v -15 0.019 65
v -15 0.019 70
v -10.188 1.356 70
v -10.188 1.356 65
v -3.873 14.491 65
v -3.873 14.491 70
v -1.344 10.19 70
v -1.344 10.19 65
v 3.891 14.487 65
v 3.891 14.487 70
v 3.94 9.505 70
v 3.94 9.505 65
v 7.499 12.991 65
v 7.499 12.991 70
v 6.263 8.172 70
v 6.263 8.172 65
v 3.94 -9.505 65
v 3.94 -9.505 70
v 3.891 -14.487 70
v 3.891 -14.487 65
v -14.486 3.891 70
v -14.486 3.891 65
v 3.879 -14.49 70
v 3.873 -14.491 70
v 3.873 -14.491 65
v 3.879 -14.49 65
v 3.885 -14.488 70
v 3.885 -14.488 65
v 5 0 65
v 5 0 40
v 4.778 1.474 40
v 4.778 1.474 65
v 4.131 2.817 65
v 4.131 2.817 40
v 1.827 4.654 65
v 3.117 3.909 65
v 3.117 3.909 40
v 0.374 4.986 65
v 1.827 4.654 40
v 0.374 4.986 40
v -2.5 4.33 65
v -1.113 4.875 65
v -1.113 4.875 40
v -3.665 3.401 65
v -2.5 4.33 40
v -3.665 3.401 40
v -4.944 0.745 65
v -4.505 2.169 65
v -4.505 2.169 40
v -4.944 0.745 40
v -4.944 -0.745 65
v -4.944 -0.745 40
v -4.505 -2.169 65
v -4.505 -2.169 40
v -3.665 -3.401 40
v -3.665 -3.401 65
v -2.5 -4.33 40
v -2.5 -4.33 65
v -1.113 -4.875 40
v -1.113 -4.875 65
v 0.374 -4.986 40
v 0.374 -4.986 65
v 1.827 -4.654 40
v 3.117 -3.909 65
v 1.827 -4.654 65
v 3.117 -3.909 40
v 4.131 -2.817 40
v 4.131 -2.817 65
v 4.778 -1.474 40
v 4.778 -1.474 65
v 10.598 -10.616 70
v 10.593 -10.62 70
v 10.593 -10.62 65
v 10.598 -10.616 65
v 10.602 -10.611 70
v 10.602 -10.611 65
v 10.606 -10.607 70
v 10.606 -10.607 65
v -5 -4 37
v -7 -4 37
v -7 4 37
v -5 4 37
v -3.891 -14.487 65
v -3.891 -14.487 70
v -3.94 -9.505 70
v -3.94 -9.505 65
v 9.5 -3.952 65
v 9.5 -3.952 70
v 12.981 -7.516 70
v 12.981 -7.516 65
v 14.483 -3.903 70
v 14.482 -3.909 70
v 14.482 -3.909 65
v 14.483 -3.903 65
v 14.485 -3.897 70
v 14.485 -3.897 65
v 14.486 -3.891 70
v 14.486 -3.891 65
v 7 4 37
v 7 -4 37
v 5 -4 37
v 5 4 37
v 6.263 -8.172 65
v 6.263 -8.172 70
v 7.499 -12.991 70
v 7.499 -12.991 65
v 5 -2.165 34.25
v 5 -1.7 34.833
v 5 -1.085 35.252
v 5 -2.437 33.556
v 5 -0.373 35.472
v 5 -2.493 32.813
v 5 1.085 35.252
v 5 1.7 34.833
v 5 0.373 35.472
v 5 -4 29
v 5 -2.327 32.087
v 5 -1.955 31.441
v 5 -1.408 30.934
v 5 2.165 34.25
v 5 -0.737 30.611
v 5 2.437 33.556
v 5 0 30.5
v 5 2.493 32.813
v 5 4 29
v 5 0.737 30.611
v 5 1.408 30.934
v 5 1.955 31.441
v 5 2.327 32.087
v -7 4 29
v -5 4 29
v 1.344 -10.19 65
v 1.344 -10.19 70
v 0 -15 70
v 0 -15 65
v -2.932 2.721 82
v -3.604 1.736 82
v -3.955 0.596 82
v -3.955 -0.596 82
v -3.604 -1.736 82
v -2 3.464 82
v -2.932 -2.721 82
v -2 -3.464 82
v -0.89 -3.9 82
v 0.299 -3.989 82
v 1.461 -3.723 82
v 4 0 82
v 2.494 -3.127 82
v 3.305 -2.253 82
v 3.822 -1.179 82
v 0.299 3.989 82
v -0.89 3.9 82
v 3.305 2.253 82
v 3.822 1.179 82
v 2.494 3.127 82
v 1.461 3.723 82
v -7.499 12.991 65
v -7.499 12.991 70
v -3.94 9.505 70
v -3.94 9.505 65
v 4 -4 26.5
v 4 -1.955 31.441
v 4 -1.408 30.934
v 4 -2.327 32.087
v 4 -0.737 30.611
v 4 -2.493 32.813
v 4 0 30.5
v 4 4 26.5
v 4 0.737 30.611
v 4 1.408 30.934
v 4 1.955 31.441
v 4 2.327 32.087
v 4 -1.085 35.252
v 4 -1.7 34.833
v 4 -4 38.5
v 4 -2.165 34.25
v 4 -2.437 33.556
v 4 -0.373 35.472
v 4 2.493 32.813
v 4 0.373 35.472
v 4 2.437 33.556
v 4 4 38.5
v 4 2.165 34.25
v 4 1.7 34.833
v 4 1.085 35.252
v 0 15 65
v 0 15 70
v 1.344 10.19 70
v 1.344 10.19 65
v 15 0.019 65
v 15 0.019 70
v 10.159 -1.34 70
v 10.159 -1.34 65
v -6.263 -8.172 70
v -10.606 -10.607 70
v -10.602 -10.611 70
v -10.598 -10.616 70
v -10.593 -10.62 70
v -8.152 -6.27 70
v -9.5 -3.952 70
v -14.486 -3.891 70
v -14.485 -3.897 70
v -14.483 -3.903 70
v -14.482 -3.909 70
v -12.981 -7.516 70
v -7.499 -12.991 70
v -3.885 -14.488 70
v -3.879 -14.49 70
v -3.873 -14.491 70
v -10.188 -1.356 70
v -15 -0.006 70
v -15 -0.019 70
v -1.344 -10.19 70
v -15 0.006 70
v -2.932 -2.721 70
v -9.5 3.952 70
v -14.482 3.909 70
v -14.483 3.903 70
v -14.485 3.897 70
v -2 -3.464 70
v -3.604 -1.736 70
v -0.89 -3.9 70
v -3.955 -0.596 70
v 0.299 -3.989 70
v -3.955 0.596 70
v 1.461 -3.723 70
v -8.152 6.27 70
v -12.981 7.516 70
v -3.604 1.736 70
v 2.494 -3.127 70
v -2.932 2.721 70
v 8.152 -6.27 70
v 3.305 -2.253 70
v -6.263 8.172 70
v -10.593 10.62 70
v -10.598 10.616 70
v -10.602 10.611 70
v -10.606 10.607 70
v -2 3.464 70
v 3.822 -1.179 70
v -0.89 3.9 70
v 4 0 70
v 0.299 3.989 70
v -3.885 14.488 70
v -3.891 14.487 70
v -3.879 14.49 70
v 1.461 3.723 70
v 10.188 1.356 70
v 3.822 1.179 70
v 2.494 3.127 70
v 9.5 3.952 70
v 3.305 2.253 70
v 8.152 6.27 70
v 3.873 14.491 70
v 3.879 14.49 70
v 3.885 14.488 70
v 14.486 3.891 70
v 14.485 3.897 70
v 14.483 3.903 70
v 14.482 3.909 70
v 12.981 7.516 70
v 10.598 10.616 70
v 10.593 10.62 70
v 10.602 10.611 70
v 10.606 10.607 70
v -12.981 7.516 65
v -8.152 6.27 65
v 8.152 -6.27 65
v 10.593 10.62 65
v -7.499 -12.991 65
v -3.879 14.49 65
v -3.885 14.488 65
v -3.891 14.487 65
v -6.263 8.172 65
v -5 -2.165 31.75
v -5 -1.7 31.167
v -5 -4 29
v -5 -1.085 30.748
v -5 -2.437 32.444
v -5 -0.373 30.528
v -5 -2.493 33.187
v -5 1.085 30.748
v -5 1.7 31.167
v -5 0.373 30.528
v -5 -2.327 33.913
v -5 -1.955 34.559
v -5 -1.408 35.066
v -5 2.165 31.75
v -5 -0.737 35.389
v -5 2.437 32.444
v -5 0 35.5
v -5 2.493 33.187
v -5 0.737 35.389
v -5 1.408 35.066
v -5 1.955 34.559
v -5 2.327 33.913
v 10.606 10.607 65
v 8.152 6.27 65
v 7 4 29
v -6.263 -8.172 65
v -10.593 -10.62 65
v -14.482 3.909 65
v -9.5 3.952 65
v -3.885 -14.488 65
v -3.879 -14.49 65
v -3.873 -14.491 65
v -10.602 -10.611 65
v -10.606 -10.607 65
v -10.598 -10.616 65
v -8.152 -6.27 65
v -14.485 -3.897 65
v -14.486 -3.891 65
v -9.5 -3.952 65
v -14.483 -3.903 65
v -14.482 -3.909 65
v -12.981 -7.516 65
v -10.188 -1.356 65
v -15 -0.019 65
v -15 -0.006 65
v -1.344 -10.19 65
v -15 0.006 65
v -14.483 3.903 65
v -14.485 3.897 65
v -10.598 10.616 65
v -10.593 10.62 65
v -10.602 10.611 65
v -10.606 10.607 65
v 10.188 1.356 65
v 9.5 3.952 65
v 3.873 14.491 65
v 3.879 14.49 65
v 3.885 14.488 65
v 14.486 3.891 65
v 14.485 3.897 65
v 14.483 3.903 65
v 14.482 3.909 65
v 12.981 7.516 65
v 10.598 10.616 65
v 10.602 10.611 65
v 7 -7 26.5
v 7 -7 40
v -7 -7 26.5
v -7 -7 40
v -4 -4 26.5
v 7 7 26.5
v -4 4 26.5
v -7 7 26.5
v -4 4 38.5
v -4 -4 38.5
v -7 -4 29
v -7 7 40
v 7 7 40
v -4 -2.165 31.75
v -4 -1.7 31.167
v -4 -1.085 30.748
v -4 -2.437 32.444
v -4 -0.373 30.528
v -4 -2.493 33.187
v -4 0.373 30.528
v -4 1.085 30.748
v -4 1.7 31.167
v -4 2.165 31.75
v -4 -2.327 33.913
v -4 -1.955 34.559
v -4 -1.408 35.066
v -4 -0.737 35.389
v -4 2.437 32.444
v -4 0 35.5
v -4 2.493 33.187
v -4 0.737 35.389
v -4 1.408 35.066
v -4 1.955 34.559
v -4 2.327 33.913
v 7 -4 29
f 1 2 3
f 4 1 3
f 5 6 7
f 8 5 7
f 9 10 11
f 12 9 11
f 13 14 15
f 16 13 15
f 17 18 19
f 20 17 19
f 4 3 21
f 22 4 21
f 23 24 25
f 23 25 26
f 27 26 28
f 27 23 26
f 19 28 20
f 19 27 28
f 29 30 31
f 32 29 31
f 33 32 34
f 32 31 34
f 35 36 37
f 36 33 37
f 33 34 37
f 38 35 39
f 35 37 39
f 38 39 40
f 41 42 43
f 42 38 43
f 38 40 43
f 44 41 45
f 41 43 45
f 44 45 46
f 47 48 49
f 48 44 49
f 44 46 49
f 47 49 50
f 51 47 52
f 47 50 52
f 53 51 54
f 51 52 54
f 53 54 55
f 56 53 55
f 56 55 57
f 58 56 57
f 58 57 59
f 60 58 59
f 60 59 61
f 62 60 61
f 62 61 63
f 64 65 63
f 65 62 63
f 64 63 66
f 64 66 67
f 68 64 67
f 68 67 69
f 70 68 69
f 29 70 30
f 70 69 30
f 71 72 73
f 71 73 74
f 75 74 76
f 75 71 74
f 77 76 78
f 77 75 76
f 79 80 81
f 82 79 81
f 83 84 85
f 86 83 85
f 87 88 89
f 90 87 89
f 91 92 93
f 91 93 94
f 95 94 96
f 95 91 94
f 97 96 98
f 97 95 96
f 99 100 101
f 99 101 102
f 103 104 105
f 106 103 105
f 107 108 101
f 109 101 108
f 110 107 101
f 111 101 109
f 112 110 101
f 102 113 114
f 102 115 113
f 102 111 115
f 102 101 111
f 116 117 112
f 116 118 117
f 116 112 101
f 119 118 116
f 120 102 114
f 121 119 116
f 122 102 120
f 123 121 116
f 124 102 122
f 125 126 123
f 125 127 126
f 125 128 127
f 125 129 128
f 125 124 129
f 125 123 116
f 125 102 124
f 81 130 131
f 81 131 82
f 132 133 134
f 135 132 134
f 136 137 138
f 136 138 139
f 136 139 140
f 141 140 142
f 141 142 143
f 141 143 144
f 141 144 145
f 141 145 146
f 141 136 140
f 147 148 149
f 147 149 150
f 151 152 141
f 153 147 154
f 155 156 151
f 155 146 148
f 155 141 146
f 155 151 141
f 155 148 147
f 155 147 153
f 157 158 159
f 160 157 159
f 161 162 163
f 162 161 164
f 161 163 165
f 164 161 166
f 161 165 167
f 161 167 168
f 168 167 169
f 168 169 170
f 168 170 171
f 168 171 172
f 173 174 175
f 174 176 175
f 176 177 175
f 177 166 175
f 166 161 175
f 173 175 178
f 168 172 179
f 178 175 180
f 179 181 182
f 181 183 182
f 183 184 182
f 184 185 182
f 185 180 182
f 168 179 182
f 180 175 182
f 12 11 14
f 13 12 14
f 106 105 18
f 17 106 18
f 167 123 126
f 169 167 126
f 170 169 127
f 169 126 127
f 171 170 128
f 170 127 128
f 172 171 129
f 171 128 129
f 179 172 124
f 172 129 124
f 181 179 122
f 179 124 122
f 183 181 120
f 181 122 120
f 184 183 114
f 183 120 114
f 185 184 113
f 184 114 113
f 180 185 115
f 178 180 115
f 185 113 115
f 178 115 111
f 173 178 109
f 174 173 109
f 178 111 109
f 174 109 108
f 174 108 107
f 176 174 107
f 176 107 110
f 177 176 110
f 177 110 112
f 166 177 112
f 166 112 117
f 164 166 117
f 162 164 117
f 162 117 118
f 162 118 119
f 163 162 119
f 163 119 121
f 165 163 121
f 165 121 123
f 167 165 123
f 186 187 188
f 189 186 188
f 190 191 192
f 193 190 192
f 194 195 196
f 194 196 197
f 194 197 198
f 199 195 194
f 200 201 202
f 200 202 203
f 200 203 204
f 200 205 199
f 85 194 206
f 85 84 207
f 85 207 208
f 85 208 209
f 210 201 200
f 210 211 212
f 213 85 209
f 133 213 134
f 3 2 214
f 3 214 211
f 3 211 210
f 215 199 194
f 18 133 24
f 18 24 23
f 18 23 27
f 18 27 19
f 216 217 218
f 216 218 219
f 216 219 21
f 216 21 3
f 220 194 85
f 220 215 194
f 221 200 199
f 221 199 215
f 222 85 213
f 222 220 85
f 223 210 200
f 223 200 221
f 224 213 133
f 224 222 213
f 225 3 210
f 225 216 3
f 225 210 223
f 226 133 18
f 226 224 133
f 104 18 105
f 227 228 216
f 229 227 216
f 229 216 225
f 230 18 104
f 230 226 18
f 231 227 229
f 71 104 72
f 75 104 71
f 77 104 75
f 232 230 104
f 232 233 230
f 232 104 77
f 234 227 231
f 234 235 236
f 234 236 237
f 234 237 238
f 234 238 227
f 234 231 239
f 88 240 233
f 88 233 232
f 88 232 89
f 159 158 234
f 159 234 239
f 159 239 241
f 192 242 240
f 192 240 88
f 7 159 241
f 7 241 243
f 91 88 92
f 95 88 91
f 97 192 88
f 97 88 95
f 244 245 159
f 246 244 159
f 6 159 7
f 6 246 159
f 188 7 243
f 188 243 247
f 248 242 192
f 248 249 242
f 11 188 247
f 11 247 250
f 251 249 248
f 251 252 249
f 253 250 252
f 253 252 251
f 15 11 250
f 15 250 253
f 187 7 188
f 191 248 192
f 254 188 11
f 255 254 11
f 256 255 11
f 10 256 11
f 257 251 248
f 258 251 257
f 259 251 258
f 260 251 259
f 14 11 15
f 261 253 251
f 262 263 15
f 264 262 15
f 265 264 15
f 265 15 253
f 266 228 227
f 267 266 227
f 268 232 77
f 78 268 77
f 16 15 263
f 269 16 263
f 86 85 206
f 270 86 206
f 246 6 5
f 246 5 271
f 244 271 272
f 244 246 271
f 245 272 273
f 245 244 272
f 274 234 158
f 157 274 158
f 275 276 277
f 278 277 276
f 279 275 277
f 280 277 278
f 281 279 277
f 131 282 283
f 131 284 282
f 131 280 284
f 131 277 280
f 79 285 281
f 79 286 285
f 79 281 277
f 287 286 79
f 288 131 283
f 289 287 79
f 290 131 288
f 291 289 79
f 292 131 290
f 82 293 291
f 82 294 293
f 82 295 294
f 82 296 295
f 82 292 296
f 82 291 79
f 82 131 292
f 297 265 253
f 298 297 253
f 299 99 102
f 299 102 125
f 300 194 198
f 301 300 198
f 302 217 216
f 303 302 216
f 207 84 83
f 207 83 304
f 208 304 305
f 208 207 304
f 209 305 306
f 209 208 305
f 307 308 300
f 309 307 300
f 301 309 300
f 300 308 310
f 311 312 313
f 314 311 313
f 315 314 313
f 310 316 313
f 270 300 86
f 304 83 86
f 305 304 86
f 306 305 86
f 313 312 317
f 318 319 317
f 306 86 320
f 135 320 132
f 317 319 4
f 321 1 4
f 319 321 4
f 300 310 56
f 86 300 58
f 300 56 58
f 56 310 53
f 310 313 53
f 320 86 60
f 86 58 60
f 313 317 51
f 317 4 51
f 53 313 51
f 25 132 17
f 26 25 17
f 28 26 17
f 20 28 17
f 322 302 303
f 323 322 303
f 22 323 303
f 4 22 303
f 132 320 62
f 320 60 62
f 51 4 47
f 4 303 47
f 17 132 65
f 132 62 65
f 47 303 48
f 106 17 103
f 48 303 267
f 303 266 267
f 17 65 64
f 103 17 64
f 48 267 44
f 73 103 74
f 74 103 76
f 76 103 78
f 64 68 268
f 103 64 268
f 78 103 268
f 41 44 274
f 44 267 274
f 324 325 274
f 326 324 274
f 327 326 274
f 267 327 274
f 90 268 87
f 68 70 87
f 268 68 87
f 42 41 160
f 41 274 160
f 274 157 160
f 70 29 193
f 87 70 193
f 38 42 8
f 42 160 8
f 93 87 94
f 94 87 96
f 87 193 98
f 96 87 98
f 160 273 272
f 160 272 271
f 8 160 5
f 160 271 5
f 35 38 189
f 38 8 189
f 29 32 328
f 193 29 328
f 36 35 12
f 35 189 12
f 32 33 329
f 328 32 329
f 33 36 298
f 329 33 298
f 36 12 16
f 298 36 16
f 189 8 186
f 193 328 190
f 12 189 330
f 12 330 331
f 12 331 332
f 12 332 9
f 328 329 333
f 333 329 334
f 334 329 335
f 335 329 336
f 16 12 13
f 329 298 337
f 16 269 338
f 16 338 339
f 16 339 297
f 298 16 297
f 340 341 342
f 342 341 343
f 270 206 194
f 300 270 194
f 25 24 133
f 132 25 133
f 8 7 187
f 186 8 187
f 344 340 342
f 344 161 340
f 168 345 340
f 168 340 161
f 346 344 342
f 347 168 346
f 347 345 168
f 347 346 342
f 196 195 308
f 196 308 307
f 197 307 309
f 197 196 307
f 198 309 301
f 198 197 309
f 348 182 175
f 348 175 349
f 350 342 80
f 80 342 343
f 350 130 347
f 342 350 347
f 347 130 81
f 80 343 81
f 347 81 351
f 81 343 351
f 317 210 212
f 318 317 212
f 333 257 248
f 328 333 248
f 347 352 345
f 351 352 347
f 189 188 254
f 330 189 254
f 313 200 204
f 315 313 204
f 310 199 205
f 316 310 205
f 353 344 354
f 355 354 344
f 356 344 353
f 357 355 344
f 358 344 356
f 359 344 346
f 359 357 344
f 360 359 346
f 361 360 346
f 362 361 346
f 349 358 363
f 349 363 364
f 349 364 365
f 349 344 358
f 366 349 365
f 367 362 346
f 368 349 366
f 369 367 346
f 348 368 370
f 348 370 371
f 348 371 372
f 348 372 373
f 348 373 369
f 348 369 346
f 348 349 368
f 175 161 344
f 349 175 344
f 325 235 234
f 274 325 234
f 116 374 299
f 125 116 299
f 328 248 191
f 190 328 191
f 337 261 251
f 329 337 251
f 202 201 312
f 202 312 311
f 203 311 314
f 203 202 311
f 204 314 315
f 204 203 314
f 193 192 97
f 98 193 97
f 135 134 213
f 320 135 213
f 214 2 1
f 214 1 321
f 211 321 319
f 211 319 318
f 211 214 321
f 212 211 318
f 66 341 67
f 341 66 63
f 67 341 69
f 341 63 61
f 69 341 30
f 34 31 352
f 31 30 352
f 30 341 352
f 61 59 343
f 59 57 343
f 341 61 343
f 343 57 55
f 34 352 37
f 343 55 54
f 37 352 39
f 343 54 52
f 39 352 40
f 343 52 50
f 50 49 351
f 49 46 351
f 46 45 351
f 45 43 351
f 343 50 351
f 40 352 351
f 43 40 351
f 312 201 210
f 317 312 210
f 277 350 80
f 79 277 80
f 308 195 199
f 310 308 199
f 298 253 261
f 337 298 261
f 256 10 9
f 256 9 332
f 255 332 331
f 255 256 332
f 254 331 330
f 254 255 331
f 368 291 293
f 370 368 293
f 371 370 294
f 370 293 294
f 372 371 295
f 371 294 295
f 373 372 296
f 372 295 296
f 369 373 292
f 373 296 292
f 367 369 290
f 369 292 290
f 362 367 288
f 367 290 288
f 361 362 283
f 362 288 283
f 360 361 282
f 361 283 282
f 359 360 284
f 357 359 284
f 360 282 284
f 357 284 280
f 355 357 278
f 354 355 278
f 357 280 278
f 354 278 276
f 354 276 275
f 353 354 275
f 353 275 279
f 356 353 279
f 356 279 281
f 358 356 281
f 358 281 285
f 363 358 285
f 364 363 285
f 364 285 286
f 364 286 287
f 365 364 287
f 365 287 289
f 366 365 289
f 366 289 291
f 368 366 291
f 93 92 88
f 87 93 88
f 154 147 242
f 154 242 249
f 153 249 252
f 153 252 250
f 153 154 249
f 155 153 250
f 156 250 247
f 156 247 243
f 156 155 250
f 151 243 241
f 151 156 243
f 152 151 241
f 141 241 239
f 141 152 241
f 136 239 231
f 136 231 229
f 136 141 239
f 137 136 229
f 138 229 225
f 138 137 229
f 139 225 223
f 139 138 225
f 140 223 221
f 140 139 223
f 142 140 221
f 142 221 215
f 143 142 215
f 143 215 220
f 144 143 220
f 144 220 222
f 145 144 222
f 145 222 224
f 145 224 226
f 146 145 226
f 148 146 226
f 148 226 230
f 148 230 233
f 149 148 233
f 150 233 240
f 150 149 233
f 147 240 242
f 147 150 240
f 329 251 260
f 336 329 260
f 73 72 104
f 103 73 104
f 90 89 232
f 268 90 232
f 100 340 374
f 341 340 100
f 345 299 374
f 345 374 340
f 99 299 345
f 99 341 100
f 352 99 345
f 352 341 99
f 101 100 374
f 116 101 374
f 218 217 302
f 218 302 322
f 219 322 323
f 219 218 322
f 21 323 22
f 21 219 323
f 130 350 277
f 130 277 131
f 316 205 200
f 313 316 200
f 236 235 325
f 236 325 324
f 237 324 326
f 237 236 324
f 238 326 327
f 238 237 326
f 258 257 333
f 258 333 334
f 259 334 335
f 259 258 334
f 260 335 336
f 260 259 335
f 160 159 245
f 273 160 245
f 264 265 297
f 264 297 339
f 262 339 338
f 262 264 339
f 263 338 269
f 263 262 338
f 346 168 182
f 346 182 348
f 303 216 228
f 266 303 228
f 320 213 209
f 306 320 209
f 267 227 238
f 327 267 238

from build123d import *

# Parameters (mm, degrees)
ESQUISSE1_R             = 5
BOSS_EXTRU_2_DEPTH      = 70
ESQUISSE2_R             = 3.5
BOSS_EXTRU_3_DEPTH      = 12
ESQUISSE4_R             = 15
BOSS_EXTRU_5_DEPTH      = 5
ESQUISSE5_R             = 3.5
BOSS_EXTRU_6_DEPTH      = 12
ENL_V_MAT_EXTRU_1_DEPTH = 12
ESQUISSE7_R             = 5
ENL_V_MAT_EXTRU_2_DEPTH = 47
ESQUISSE8_W             = 14
ESQUISSE8_H             = 14
BOSS_EXTRU_7_DEPTH      = 5
ESQUISSE9_W             = 14
ESQUISSE9_H             = 14
ESQUISSE9_W_2           = 8
ESQUISSE9_H_2           = 8
BOSS_EXTRU_8_DEPTH      = 4.5
ESQUISSE10_W            = 8
ESQUISSE10_H            = 8
ENL_V_MAT_EXTRU_3_DEPTH = 3.5
ESQUISSE12_W            = 14
ESQUISSE12_H            = 14
ESQUISSE12_W_2          = 8
ESQUISSE12_H_2          = 8
BOSS_EXTRU_9_DEPTH      = 4
ESQUISSE14_W            = 8
ESQUISSE14_H            = 8
ENL_V_MAT_EXTRU_4_DEPTH = 2
ESQUISSE15_R            = 2.5
ENL_V_MAT_EXTRU_5_DEPTH = 2
ESQUISSE16_W            = 8
ESQUISSE16_H            = 8
ENL_V_MAT_EXTRU_6_DEPTH = 2
ESQUISSE17_R            = 2.5
ENL_V_MAT_EXTRU_7_DEPTH = 2
ESQUISSE18_R            = 4
BOSS_EXTRU_10_DEPTH     = 12


with BuildPart() as part:
    # Esquisse1 → Boss.-Extru.2 (new body)
    with BuildSketch(Plane.XY):
        Circle(ESQUISSE1_R)
    extrude(amount=BOSS_EXTRU_2_DEPTH)

    # Esquisse2 → Boss.-Extru.3 (add)
    with BuildSketch(Plane(origin=(0, 0, 0), x_dir=(-1, 0, 0), z_dir=(0, 0, -1))):
        Circle(ESQUISSE2_R)
    extrude(amount=BOSS_EXTRU_3_DEPTH)

    # Esquisse4 → Boss.-Extru.5 (add)
    with BuildSketch(Plane.XY.offset(70)):
        Circle(ESQUISSE4_R)
    extrude(amount=-BOSS_EXTRU_5_DEPTH)

    # Esquisse5 → Boss.-Extru.6 (add)
    with BuildSketch(Plane.XY.offset(70)):
        Circle(ESQUISSE5_R)
    extrude(amount=BOSS_EXTRU_6_DEPTH)

    # Esquisse6 → Enlèv. mat.-Extru.1 (cut)
    with BuildSketch(Plane.XY.offset(70)):
        with BuildLine():
            Line((-6.262893089, 8.172072336), (-7.499435292, 12.990707074))
            ThreePointArc((-7.499435292, 12.990707074), (-9.123657799, 11.90625333), (-10.593218546, 10.619968024))
            Line((-10.593218546, 10.619968024), (-6.262893089, 8.172072336))
        make_face()
        with BuildLine():
            Line((-8.152402023, 6.270263162), (-10.606442664, 10.606760769))
            ThreePointArc((-10.606442664, 10.606760769), (-11.894621233, 9.138817524), (-12.981158937, 7.515950549))
            Line((-12.981158937, 7.515950549), (-8.152402023, 6.270263162))
        make_face()
        with BuildLine():
            Line((-9.499942261, 3.951679007), (-12.981158937, 7.515950549))
            ThreePointArc((-12.981158937, 7.515950549), (-13.849269023, 5.761748652), (-14.481582106, 3.909447494))
            Line((-14.481582106, 3.909447494), (-9.499942261, 3.951679007))
        make_face()
        with BuildLine():
            Line((-10.188028074, 1.356459322), (-14.486441985, 3.891400598))
            ThreePointArc((-14.486441985, 3.891400598), (-14.869805294, 1.972027008), (-14.999987869, 0.0190767))
            Line((-14.999987869, 0.0190767), (-10.188028074, 1.356459322))
        make_face()
        with BuildLine():
            ThreePointArc((-14.999987869, -0.0190767), (-14.869805294, -1.972027008), (-14.486441985, -3.891400598))
            Line((-14.486441985, -3.891400598), (-10.188028074, -1.356459322))
            Line((-10.188028074, -1.356459322), (-14.999987869, -0.0190767))
        make_face()
        with BuildLine():
            Line((-9.499942261, -3.951679007), (-14.481582106, -3.909447494))
            ThreePointArc((-14.481582106, -3.909447494), (-13.849269023, -5.761748652), (-12.981158937, -7.515950549))
            Line((-12.981158937, -7.515950549), (-9.499942261, -3.951679007))
        make_face()
        with BuildLine():
            Line((-8.152402023, -6.270263162), (-12.981158937, -7.515950549))
            ThreePointArc((-12.981158937, -7.515950549), (-11.894621233, -9.138817524), (-10.606442664, -10.606760769))
            Line((-10.606442664, -10.606760769), (-8.152402023, -6.270263162))
        make_face()
        with BuildLine():
            Line((-6.262893089, -8.172072336), (-10.593218546, -10.619968024))
            ThreePointArc((-10.593218546, -10.619968024), (-9.123657799, -11.90625333), (-7.499435292, -12.990707074))
            Line((-7.499435292, -12.990707074), (-6.262893089, -8.172072336))
        make_face()
        with BuildLine():
            Line((-3.939593974, -9.504960245), (-7.499435292, -12.990707074))
            ThreePointArc((-7.499435292, -12.990707074), (-5.744130769, -13.8565855), (-3.891026946, -14.486542352))
            Line((-3.891026946, -14.486542352), (-3.939593974, -9.504960245))
        make_face()
        with BuildLine():
            Line((-1.343501295, -10.189744953), (-3.872973884, -14.491379275))
            ThreePointArc((-3.872973884, -14.491379275), (-1.953114292, -14.872301253), (0, -15))
            Line((0, -15), (-1.343501295, -10.189744953))
        make_face()
        with BuildLine():
            ThreePointArc((0, -15), (1.953114292, -14.872301253), (3.872973884, -14.491379275))
            Line((3.872973884, -14.491379275), (1.343501295, -10.189744953))
            Line((1.343501295, -10.189744953), (0, -15))
        make_face()
        with BuildLine():
            ThreePointArc((3.891026946, -14.486542352), (5.744130769, -13.8565855), (7.499435292, -12.990707074))
            Line((7.499435292, -12.990707074), (3.939593974, -9.504960245))
            Line((3.939593974, -9.504960245), (3.891026946, -14.486542352))
        make_face()
        with BuildLine():
            ThreePointArc((7.499435292, -12.990707074), (9.123657799, -11.90625333), (10.593218546, -10.619968024))
            Line((10.593218546, -10.619968024), (6.262893089, -8.172072336))
            Line((6.262893089, -8.172072336), (7.499435292, -12.990707074))
        make_face()
        with BuildLine():
            ThreePointArc((10.606442664, -10.606760769), (11.894621233, -9.138817524), (12.981158937, -7.515950549))
            Line((12.981158937, -7.515950549), (8.152402023, -6.270263162))
            Line((8.152402023, -6.270263162), (10.606442664, -10.606760769))
        make_face()
        with BuildLine():
            ThreePointArc((12.981158937, -7.515950549), (13.849269023, -5.761748652), (14.481582106, -3.909447494))
            Line((14.481582106, -3.909447494), (9.499942261, -3.951679007))
            Line((9.499942261, -3.951679007), (12.981158937, -7.515950549))
        make_face()
        with BuildLine():
            ThreePointArc((15, 0), (14.999996967, 0.009538352), (14.999987869, 0.0190767))
            Line((14.999987869, 0.0190767), (10.159352957, -1.339548494))
            Line((10.159352957, -1.339548494), (14.486441985, -3.891400598))
            ThreePointArc((14.486441985, -3.891400598), (14.87105628, -1.962571047), (15, 0))
        make_face()
        with BuildLine():
            ThreePointArc((14.999987869, 0.0190767), (14.869805294, 1.972027008), (14.486441985, 3.891400598))
            Line((14.486441985, 3.891400598), (10.188028074, 1.356459322))
            Line((10.188028074, 1.356459322), (14.999987869, 0.0190767))
        make_face()
        with BuildLine():
            ThreePointArc((14.481582106, 3.909447494), (13.849269023, 5.761748652), (12.981158937, 7.515950549))
            Line((12.981158937, 7.515950549), (9.499942261, 3.951679007))
            Line((9.499942261, 3.951679007), (14.481582106, 3.909447494))
        make_face()
        with BuildLine():
            ThreePointArc((12.981158937, 7.515950549), (11.894621233, 9.138817524), (10.606442664, 10.606760769))
            Line((10.606442664, 10.606760769), (8.152402023, 6.270263162))
            Line((8.152402023, 6.270263162), (12.981158937, 7.515950549))
        make_face()
        with BuildLine():
            ThreePointArc((10.593218546, 10.619968024), (9.123657799, 11.90625333), (7.499435292, 12.990707074))
            Line((7.499435292, 12.990707074), (6.262893089, 8.172072336))
            Line((6.262893089, 8.172072336), (10.593218546, 10.619968024))
        make_face()
        with BuildLine():
            ThreePointArc((7.499435292, 12.990707074), (5.744130769, 13.8565855), (3.891026946, 14.486542352))
            Line((3.891026946, 14.486542352), (3.939593974, 9.504960245))
            Line((3.939593974, 9.504960245), (7.499435292, 12.990707074))
        make_face()
        with BuildLine():
            ThreePointArc((3.872973884, 14.491379275), (1.953114292, 14.872301253), (0, 15))
            Line((0, 15), (1.343501295, 10.189744953))
            Line((1.343501295, 10.189744953), (3.872973884, 14.491379275))
        make_face()
        with BuildLine():
            Line((-1.343501295, 10.189744953), (0, 15))
            ThreePointArc((0, 15), (-1.953114292, 14.872301253), (-3.872973884, 14.491379275))
            Line((-3.872973884, 14.491379275), (-1.343501295, 10.189744953))
        make_face()
        with BuildLine():
            Line((-3.939593974, 9.504960245), (-3.891026946, 14.486542352))
            ThreePointArc((-3.891026946, 14.486542352), (-5.744130769, 13.8565855), (-7.499435292, 12.990707074))
            Line((-7.499435292, 12.990707074), (-3.939593974, 9.504960245))
        make_face()
    extrude(amount=-ENL_V_MAT_EXTRU_1_DEPTH, mode=Mode.SUBTRACT)

    # Esquisse7 → Enlèv. mat.-Extru.2 (cut)
    with BuildSketch(Plane(origin=(0, 0, -12), x_dir=(-1, 0, 0), z_dir=(0, 0, -1))):
        Circle(ESQUISSE7_R)
    extrude(amount=-ENL_V_MAT_EXTRU_2_DEPTH, mode=Mode.SUBTRACT)

    # Esquisse8 → Boss.-Extru.7 (add)
    with BuildSketch(Plane(origin=(0, 0, 35), x_dir=(-1, 0, 0), z_dir=(0, 0, -1))):
        Rectangle(ESQUISSE8_W, ESQUISSE8_H)
    extrude(amount=-BOSS_EXTRU_7_DEPTH)

    # Esquisse9 → Boss.-Extru.8 (add)
    with BuildSketch(Plane(origin=(0, 0, 35), x_dir=(-1, 0, 0), z_dir=(0, 0, -1))):
        Rectangle(ESQUISSE9_W, ESQUISSE9_H)
        Rectangle(ESQUISSE9_W_2, ESQUISSE9_H_2, mode=Mode.SUBTRACT)
    extrude(amount=BOSS_EXTRU_8_DEPTH)

    # Esquisse10 → Enlèv. mat.-Extru.3 (cut)
    with BuildSketch(Plane(origin=(0, 0, 35), x_dir=(-1, 0, 0), z_dir=(0, 0, -1))):
        Rectangle(ESQUISSE10_W, ESQUISSE10_H)
    extrude(amount=-ENL_V_MAT_EXTRU_3_DEPTH, mode=Mode.SUBTRACT)

    # Esquisse12 → Boss.-Extru.9 (add)
    with BuildSketch(Plane(origin=(0, 0, 30.5), x_dir=(-1, 0, 0), z_dir=(0, 0, -1))):
        Rectangle(ESQUISSE12_W, ESQUISSE12_H)
        Rectangle(ESQUISSE12_W_2, ESQUISSE12_H_2, mode=Mode.SUBTRACT)
    extrude(amount=BOSS_EXTRU_9_DEPTH)

    # Esquisse14 → Enlèv. mat.-Extru.4 (cut)
    with BuildSketch(Plane.ZY.offset(7)):
        with Locations((33, 0)):
            Rectangle(ESQUISSE14_W, ESQUISSE14_H)
    extrude(amount=-ENL_V_MAT_EXTRU_4_DEPTH, mode=Mode.SUBTRACT)

    # Esquisse15 → Enlèv. mat.-Extru.5 (cut)
    with BuildSketch(Plane.ZY.offset(5)):
        with Locations((33, 0)):
            Circle(ESQUISSE15_R)
    extrude(amount=-ENL_V_MAT_EXTRU_5_DEPTH, mode=Mode.SUBTRACT)

    # Esquisse16 → Enlèv. mat.-Extru.6 (cut)
    with BuildSketch(Plane(origin=(7, 0, 0), x_dir=(0, 0, -1), z_dir=(1, 0, 0))):
        with Locations((-33, 0)):
            Rectangle(ESQUISSE16_W, ESQUISSE16_H)
    extrude(amount=-ENL_V_MAT_EXTRU_6_DEPTH, mode=Mode.SUBTRACT)

    # Esquisse17 → Enlèv. mat.-Extru.7 (cut)
    with BuildSketch(Plane(origin=(5, 0, 0), x_dir=(0, 0, -1), z_dir=(1, 0, 0))):
        with Locations((-33, 0)):
            Circle(ESQUISSE17_R)
    extrude(amount=-ENL_V_MAT_EXTRU_7_DEPTH, mode=Mode.SUBTRACT)

    # Esquisse18 → Boss.-Extru.10 (add)
    with BuildSketch(Plane.XY.offset(82)):
        Circle(ESQUISSE18_R)
    extrude(amount=-BOSS_EXTRU_10_DEPTH)


solid = part.part
